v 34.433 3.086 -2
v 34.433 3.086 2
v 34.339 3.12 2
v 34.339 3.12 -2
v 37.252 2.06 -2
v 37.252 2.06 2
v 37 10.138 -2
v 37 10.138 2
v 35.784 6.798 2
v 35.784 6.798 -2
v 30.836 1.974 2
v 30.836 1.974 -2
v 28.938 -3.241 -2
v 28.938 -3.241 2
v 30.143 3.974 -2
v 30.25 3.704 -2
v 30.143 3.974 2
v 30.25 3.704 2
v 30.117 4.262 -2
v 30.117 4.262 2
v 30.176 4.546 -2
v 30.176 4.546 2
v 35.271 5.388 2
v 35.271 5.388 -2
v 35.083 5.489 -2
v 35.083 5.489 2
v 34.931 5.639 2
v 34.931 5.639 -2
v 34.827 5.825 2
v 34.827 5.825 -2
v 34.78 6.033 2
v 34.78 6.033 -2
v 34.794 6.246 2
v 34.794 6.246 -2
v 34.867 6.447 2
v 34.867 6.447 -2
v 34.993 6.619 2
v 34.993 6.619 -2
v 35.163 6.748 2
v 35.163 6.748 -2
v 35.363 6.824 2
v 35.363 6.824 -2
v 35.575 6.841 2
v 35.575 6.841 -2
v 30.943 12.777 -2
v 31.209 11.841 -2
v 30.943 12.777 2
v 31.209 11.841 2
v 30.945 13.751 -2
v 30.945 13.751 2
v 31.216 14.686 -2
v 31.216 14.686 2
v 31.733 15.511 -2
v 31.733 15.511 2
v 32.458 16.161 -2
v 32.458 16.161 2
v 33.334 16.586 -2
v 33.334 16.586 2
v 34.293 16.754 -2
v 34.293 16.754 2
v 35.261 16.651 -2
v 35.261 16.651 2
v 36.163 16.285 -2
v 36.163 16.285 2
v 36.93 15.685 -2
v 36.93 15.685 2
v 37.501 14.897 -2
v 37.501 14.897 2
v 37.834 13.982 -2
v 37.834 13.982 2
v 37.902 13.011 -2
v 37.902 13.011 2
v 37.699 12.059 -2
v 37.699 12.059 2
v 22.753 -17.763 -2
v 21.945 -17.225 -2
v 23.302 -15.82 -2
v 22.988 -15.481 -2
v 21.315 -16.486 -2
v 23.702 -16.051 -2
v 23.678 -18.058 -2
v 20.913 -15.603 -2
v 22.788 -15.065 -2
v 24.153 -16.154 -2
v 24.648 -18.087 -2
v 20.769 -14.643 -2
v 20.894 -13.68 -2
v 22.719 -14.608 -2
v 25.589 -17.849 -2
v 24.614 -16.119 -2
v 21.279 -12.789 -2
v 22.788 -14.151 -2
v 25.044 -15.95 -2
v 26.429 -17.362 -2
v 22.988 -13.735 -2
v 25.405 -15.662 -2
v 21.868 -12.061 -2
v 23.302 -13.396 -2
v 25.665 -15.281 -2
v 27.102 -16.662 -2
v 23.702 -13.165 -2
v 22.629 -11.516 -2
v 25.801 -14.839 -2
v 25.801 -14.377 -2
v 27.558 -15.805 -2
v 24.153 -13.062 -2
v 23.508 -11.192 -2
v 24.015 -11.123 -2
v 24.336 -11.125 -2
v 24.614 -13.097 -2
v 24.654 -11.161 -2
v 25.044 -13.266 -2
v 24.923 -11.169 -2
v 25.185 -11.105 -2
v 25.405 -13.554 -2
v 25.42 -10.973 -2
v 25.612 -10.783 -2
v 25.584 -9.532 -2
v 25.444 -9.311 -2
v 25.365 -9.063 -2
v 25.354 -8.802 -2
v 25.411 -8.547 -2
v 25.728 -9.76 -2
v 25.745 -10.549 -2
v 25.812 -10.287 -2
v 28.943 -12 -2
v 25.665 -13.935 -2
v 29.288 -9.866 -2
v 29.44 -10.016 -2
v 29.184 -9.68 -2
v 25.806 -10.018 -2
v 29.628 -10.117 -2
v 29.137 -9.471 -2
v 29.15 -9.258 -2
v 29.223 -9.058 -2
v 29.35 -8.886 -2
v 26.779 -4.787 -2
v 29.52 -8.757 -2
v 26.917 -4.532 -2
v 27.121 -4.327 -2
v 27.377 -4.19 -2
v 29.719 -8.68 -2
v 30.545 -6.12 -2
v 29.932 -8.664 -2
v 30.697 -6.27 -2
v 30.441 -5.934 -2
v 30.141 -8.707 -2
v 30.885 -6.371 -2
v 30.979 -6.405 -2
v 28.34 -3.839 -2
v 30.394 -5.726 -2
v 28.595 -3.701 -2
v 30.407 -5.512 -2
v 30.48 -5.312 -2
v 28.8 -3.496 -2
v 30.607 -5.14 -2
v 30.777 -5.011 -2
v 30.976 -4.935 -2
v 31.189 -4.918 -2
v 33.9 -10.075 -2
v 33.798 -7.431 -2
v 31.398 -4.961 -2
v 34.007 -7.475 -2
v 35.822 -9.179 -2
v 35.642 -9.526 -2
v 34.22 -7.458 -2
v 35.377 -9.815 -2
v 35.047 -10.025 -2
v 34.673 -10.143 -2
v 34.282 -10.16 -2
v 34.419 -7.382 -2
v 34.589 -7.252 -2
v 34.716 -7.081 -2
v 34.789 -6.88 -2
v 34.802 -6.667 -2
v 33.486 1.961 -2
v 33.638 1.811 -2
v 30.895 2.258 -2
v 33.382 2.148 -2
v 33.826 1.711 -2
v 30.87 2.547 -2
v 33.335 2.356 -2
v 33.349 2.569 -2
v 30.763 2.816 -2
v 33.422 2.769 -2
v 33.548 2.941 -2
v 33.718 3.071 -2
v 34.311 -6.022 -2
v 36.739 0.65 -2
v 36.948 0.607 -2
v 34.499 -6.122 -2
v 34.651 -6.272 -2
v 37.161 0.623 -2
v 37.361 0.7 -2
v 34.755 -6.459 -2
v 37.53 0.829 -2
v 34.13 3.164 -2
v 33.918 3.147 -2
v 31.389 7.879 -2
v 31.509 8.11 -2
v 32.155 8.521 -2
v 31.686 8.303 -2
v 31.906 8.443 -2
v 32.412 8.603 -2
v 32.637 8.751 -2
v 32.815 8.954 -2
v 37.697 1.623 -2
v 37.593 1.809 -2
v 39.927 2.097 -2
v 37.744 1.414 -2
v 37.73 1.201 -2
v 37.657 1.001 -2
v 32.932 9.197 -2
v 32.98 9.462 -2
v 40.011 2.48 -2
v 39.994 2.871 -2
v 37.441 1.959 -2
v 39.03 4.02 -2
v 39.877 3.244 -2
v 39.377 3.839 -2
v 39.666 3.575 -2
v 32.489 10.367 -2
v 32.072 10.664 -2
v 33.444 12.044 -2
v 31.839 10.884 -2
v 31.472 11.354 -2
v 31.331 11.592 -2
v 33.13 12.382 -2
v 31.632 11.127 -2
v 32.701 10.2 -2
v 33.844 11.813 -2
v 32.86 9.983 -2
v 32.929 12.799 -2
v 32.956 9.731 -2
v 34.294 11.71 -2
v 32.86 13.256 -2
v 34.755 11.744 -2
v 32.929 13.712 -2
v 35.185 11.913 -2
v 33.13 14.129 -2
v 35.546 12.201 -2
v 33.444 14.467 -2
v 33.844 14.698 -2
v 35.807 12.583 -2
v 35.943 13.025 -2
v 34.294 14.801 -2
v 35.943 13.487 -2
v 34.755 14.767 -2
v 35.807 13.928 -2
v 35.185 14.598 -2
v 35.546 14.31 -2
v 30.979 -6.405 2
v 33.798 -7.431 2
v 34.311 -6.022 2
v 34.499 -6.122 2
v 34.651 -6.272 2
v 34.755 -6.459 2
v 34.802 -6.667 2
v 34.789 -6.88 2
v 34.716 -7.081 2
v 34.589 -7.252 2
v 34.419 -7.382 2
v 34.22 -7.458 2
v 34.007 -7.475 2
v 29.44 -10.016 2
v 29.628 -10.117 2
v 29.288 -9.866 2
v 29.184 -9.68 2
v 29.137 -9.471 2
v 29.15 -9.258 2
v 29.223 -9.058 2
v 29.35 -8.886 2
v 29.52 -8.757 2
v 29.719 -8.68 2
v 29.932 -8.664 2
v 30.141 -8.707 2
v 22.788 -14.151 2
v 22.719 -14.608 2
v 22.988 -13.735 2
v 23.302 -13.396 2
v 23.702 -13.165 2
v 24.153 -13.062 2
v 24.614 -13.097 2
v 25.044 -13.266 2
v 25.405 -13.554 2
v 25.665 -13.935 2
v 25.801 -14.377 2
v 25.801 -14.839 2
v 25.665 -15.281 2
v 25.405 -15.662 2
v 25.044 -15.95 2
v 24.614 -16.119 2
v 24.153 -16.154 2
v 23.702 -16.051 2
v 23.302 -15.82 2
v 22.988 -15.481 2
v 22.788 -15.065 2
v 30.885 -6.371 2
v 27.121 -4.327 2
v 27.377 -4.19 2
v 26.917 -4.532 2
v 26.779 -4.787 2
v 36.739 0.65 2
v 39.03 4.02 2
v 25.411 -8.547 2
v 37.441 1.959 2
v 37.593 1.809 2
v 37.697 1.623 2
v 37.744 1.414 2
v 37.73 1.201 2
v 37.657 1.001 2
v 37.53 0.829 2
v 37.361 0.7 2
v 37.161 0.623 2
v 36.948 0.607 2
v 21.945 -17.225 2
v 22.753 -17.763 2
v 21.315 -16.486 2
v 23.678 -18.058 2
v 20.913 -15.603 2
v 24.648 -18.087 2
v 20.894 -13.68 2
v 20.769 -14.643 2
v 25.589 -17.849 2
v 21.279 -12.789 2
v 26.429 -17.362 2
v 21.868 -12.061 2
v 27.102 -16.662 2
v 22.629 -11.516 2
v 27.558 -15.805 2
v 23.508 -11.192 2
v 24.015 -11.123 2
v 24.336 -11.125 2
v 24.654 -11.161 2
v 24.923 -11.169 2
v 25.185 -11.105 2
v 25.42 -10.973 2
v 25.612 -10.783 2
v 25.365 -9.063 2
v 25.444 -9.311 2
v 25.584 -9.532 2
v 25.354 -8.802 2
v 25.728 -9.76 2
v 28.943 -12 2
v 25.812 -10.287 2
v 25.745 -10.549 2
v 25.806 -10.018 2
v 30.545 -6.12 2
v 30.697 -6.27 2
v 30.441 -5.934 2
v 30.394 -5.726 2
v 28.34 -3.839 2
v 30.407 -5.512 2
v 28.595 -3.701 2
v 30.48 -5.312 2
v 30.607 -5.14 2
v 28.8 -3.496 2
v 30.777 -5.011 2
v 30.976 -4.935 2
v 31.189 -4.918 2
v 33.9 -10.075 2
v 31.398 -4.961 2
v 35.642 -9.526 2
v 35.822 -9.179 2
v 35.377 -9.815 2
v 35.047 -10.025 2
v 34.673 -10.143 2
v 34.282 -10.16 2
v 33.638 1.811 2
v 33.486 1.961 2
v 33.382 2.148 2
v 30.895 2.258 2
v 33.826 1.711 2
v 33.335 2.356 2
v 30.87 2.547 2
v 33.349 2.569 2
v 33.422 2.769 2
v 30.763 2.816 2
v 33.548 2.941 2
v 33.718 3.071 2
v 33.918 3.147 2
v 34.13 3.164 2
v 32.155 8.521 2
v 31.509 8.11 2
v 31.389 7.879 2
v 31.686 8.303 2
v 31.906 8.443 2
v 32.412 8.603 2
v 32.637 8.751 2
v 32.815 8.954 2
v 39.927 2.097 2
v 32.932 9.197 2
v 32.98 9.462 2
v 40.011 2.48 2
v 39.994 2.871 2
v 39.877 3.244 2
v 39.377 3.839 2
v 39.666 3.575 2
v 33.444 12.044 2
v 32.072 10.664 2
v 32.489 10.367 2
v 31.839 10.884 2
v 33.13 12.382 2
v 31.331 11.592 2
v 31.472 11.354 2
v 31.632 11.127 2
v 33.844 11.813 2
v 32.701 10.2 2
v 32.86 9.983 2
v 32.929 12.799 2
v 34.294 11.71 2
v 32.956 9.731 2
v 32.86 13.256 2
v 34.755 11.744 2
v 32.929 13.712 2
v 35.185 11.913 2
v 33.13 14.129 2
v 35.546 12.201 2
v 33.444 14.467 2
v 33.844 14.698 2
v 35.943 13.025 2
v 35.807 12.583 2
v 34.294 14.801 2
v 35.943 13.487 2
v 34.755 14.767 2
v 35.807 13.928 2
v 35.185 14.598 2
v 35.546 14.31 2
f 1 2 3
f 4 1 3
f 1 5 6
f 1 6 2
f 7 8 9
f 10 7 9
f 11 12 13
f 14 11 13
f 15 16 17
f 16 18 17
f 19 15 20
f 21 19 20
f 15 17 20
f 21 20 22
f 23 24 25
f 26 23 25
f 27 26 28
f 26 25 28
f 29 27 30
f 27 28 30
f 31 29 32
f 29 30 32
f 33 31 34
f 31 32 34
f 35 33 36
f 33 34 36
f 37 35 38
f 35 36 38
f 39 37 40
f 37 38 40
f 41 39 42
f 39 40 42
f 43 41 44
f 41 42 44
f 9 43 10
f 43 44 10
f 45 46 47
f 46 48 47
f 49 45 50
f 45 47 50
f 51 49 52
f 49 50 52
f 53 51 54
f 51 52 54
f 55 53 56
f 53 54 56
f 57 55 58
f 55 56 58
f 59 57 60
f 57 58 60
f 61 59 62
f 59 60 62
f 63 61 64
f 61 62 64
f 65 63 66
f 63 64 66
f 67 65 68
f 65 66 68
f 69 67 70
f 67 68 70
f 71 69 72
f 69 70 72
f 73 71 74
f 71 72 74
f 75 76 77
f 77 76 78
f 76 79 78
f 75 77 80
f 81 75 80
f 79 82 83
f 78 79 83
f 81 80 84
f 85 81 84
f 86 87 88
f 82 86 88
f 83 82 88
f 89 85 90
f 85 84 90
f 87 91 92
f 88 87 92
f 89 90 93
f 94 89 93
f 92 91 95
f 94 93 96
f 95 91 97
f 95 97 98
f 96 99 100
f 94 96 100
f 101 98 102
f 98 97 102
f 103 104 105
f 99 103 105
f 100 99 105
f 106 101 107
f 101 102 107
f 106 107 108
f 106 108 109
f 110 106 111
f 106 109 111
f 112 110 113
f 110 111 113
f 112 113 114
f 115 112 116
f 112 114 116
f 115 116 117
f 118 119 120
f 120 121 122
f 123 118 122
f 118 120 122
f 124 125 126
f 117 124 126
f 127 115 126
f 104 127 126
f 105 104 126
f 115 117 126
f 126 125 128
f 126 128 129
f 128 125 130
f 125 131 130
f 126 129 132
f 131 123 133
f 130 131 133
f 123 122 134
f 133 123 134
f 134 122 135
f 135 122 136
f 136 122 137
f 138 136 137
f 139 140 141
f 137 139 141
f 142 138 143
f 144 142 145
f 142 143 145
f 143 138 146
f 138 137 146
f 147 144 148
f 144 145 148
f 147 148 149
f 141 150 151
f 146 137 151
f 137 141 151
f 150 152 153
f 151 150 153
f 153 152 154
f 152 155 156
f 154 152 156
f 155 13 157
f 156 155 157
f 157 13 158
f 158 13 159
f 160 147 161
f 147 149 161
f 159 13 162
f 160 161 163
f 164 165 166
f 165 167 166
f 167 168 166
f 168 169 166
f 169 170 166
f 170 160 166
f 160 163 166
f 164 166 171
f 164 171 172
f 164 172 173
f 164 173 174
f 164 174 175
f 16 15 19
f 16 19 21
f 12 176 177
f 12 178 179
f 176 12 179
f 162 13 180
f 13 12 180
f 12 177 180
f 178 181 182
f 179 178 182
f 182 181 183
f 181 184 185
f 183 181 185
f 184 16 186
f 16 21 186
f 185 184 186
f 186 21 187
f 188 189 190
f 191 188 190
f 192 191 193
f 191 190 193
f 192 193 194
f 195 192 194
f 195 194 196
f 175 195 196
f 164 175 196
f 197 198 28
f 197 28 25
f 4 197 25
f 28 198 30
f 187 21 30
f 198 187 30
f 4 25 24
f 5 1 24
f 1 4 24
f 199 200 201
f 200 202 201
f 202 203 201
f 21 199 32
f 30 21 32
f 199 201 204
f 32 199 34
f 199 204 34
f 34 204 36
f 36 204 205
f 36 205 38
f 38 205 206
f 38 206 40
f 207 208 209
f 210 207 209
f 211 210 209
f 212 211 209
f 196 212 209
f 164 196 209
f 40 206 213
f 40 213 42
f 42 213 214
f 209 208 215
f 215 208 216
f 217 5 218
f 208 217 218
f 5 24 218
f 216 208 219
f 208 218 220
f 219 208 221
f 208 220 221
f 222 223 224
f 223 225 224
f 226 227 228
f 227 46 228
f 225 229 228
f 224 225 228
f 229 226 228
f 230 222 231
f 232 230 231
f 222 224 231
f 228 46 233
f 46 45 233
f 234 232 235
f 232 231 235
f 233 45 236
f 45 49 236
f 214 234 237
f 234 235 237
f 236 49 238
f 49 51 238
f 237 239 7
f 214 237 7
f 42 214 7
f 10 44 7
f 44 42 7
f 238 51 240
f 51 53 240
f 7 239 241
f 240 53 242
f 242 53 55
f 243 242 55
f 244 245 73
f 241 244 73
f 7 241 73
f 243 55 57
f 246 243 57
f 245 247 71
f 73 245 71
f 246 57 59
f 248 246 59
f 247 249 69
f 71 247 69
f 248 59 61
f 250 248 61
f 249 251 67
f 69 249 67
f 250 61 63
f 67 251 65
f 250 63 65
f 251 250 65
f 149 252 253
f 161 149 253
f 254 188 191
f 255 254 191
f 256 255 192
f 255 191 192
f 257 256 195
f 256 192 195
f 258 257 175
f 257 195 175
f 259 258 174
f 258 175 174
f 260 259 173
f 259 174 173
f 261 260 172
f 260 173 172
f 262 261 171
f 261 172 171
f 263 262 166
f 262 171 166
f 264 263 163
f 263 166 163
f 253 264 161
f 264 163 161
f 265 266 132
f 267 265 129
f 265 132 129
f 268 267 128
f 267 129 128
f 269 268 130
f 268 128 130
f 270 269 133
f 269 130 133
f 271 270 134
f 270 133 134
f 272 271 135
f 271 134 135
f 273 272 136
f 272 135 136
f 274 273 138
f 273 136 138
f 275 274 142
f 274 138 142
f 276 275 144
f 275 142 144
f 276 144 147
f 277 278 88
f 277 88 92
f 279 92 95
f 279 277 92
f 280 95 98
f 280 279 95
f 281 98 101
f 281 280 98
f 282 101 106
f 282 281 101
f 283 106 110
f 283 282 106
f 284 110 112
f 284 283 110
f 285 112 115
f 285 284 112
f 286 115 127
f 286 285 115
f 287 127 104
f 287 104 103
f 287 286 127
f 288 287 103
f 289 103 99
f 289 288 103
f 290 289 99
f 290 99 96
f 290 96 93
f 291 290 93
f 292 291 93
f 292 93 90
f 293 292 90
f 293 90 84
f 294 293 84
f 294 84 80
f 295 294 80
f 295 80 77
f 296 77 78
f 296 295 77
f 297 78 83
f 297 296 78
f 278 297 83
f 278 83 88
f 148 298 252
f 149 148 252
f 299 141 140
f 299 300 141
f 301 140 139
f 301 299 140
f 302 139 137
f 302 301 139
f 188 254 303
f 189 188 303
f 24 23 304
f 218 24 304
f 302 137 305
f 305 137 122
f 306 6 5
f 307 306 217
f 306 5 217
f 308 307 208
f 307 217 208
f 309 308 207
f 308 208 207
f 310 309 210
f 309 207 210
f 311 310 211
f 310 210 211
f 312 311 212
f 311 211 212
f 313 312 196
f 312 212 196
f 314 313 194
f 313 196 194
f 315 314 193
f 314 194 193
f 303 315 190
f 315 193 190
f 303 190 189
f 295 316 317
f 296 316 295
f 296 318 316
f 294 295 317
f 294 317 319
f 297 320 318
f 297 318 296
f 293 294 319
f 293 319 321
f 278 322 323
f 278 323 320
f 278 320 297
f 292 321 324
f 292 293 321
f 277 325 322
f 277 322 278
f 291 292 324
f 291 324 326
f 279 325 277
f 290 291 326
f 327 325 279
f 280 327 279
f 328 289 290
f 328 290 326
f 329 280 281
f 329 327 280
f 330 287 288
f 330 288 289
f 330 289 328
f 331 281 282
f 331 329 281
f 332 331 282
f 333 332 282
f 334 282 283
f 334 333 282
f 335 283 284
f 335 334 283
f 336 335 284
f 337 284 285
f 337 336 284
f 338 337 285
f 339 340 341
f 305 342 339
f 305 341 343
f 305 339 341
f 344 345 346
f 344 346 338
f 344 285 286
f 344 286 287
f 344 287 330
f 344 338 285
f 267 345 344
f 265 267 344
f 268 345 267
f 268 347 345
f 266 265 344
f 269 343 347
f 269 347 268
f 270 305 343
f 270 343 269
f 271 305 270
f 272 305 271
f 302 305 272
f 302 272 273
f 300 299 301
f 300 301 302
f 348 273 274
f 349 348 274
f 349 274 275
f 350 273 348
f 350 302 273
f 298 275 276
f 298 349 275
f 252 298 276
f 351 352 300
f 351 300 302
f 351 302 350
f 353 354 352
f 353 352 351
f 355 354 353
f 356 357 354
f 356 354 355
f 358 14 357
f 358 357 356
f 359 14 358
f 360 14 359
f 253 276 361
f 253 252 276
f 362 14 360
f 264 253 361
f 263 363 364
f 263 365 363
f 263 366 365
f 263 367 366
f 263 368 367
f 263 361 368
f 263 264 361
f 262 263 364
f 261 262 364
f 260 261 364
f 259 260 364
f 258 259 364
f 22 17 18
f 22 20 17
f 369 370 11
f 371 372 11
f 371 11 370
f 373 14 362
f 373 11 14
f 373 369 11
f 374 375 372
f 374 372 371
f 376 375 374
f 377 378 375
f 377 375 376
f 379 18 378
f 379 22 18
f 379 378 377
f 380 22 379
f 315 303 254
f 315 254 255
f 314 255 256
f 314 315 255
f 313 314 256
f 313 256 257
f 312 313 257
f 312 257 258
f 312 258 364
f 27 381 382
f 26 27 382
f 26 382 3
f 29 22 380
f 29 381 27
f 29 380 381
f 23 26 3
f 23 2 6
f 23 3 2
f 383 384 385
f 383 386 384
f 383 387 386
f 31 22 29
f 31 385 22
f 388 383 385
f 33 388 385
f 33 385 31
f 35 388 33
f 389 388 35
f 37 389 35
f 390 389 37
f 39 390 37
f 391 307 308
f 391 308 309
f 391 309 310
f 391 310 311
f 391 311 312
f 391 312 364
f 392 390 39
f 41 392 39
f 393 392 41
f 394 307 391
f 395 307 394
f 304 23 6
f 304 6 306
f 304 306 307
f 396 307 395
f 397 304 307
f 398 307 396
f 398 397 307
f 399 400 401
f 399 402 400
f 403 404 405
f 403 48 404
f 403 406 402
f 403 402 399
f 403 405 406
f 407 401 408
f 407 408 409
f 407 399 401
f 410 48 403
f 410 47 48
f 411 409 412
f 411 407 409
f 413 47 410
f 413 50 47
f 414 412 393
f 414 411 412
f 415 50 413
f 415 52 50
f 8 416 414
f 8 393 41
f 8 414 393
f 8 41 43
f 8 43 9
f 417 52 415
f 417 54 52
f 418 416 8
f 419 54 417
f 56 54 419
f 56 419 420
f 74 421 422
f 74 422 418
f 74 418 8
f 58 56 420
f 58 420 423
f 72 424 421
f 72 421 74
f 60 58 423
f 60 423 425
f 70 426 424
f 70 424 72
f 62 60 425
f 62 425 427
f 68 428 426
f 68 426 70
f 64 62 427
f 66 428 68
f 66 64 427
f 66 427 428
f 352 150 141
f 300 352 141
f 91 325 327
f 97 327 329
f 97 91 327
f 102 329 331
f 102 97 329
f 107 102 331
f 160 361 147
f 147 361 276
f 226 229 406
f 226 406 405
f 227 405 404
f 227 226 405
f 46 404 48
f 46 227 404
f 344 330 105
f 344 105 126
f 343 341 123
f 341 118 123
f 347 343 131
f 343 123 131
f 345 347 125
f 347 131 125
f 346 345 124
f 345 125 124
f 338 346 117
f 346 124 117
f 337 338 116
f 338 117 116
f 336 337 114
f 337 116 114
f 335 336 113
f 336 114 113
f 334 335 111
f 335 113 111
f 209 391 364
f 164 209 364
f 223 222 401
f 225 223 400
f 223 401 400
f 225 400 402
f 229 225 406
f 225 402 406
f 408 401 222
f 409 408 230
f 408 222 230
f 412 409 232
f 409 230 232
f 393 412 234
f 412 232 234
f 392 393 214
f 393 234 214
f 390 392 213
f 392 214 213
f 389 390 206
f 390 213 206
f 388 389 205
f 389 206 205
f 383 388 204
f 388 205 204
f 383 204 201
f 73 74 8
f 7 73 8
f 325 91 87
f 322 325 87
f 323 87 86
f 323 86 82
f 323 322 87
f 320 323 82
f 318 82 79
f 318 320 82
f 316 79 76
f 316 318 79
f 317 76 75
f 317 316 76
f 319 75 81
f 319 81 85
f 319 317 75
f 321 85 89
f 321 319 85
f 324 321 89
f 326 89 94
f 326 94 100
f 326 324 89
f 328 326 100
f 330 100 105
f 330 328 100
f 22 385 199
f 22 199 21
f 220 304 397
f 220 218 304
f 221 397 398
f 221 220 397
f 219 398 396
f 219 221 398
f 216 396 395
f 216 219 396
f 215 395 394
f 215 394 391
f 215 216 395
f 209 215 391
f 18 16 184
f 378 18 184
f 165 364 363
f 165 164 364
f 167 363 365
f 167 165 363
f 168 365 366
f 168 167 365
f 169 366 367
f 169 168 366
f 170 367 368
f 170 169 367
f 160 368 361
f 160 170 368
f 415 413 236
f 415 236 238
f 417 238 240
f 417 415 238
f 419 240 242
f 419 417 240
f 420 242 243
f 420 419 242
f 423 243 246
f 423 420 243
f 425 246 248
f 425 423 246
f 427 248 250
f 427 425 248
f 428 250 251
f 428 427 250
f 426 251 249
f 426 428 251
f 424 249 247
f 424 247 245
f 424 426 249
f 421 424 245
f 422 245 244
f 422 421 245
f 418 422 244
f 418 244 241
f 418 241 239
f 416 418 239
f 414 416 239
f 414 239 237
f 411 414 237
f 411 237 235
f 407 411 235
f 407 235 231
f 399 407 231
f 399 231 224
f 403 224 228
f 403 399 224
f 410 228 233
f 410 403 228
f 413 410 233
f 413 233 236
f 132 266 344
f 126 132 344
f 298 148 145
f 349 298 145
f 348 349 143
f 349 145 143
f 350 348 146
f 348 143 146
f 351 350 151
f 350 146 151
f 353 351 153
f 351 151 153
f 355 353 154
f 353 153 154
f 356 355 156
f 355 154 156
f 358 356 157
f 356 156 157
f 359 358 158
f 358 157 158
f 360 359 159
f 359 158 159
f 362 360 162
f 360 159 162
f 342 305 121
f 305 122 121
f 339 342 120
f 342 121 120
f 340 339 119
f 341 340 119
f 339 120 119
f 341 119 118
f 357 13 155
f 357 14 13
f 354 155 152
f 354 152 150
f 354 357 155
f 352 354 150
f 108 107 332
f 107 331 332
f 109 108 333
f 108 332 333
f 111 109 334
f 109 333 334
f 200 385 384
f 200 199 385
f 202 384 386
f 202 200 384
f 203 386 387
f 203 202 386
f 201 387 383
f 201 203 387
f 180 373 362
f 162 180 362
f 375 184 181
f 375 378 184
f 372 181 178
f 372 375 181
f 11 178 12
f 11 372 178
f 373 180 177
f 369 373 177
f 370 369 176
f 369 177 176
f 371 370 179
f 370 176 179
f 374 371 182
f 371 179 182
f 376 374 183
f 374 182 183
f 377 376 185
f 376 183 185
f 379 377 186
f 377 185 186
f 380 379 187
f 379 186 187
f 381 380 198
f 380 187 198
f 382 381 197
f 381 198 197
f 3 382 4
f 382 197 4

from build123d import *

# Parameters (mm, degrees)
SKETCH_1_R             = 7
SKETCH_1_R_2           = 1.55
EXTRUDE_1_DEPTH        = 2
FILLET_1_R             = 1
CUT_EXTRUDE_START      = -5
CUT_EXTRUDE_1_DEPTH    = 6
FILLET_2_R             = 1
FILLET_2_OF_MIRROR_1_R = 1
SKETCH_3_R             = 1.55
EXTRUDE_2_DEPTH        = 4
FILLET_3_R             = 1
CUT_EXTRUDE_2_DEPTH    = 5
FILLET_4_R             = 1
CUT_EXTRUDE_3_DEPTH    = 5
EXTRUDE_3_DEPTH        = 4
SKETCH_8_R             = 0.75
CUT_EXTRUDE_4_DEPTH    = 5
FILLET_5_R             = 1.5
CUT_EXTRUDE_5_DEPTH    = 5
EXTRUDE_4_DEPTH        = 4
CUT_EXTRUDE_6_DEPTH    = 5
SKETCH_12_R            = 1
CUT_EXTRUDE_7_DEPTH    = 5
FILLET_6_R             = 3
FILLET_7_R             = 1
FILLET_8_R             = 1


with BuildPart() as part:
    # 草图1 → 凸台-拉伸1 (new body, symmetric)
    with BuildSketch(Plane.XY):
        with BuildLine():
            Line((-17.5, 11), (-10, 11))
            Line((-10, 11), (-8.321800738, 9))
            Line((-8.321800738, 9), (8.321800738, 9))
            Line((8.321800738, 9), (10, 11))
            Line((10, 11), (17.5, 11))
            ThreePointArc((17.5, 11), (17.577641076, 10.999138732), (17.655243941, 10.99655535))
            Line((17.655243941, 10.99655535), (37, 10.137665421))
            Line((37, 10.137665421), (28.942548731, -12))
            Line((28.942548731, -12), (17.199216279, -10.987051642))
            ThreePointArc((17.199216279, -10.987051642), (15.184578245, -10.124656567), (14.077678472, -8.233290774))
            Line((14.077678472, -8.233290774), (2.304628146, -10.75586766))
            ThreePointArc((2.304628146, -10.75586766), (0, -11), (-2.304628146, -10.75586766))
            Line((-2.304628146, -10.75586766), (-14.077678472, -8.233290774))
            ThreePointArc((-14.077678472, -8.233290774), (-15.184578245, -10.124656567), (-17.199216279, -10.987051642))
            Line((-17.199216279, -10.987051642), (-28.942548731, -12))
            Line((-28.942548731, -12), (-37, 10.137665421))
            Line((-37, 10.137665421), (-17.655243941, 10.99655535))
            ThreePointArc((-17.655243941, 10.99655535), (-17.577641076, 10.999138732), (-17.5, 11))
        make_face()
        Circle(SKETCH_1_R, mode=Mode.SUBTRACT)
        with Locations((17.5, 7.5)):
            Circle(SKETCH_1_R_2, mode=Mode.SUBTRACT)
        with Locations((17.5, -7.5)):
            Circle(SKETCH_1_R_2, mode=Mode.SUBTRACT)
        with Locations((-17.5, -7.5)):
            Circle(SKETCH_1_R_2, mode=Mode.SUBTRACT)
        with Locations((-17.5, 7.5)):
            Circle(SKETCH_1_R_2, mode=Mode.SUBTRACT)
    extrude(amount=EXTRUDE_1_DEPTH, both=True)

    # 圆角1
    fillet_1_edges = [part.edges().sort_by_distance(p)[0] for p in [
        (14.077678472, -8.233290774, 0),
        (-14.077678472, -8.233290774, 0),
    ]]
    fillet(fillet_1_edges, radius=FILLET_1_R)

    # 草图2 → 切除-拉伸1 (cut)
    with BuildSketch(Plane.XY.offset(2).offset(CUT_EXTRUDE_START)):
        Polygon((-20.5, 7.867295251), (-32.782632739, 7.321957304), (-27.222903771, -7.953272497), align=None)
        with BuildLine():
            Line((-19.251811465, 4.412338006), (-24.573190843, -8.11011447))
            Line((-24.573190843, -8.11011447), (-21.036866665, -7.805080632))
            ThreePointArc((-21.036866665, -7.805080632), (-20.623106229, -5.812188553), (-19.182687898, -4.374130291))
            Line((-19.182687898, -4.374130291), (-15.331076504, 4.689613751))
            ThreePointArc((-15.331076504, 4.689613751), (-17.24956823, 3.958844267), (-19.251811465, 4.412338006))
        make_face()
    cut_extrude_1 = extrude(amount=CUT_EXTRUDE_1_DEPTH, mode=Mode.SUBTRACT)

    # 圆角2
    fillet_2_edges = [part.edges().sort_by_distance(p)[0] for p in [
        (-20.5, 7.867295251, 0),
        (-27.222903771, -7.953272497, 0),
        (-32.782632739, 7.321957304, 0),
        (-19.251811465, 4.412338006, 0),
        (-15.331076504, 4.689613751, 0),
        (-19.182687898, -4.374130291, 0),
        (-21.036866665, -7.805080632, 0),
        (-24.573190843, -8.11011447, 0),
    ]]
    fillet(fillet_2_edges, radius=FILLET_2_R)

    # 镜向1: 切除-拉伸1 across plane
    add(cut_extrude_1.mirror(Plane(origin=(0, 0, 0), x_dir=(0, 0, 1), z_dir=(1, 0, 0))), mode=Mode.SUBTRACT)

    # 圆角2 of 镜向1
    fillet_2_of_mirror_1_edges = [part.edges().sort_by_distance(p)[0] for p in [
        (20.5, 7.867295251, 0),
        (27.222903771, -7.953272497, 0),
        (32.782632739, 7.321957304, 0),
        (19.251811465, 4.412338006, 0),
        (15.331076504, 4.689613751, 0),
        (19.182687898, -4.374130291, 0),
        (21.036866665, -7.805080632, 0),
        (24.573190843, -8.11011447, 0),
    ]]
    fillet(fillet_2_of_mirror_1_edges, radius=FILLET_2_OF_MIRROR_1_R)

    # 草图3 → 凸台-拉伸2 (add)
    with BuildSketch(Plane.XY.offset(2)):
        with BuildLine():
            Line((-37.69913918, 12.058534531), (-37, 10.137665421))
            Line((-37, 10.137665421), (-32.4761474, 10.338520445))
            ThreePointArc((-32.4761474, 10.338520445), (-33.315445081, 16.579981486), (-37.69913918, 12.058534531))
        make_face()
        with Locations((-34.410215007, 13.255605032)):
            Circle(SKETCH_3_R, mode=Mode.SUBTRACT)
        with BuildLine():
            Line((-27.557621455, -15.805056417), (-28.942548731, -12))
            Line((-28.942548731, -12), (-22.730405687, -11.464157204))
            ThreePointArc((-22.730405687, -11.464157204), (-21.928391725, -17.210478932), (-27.557621455, -15.805056417))
        make_face()
        with Locations((-24.268697282, -14.607985915)):
            Circle(SKETCH_3_R, mode=Mode.SUBTRACT)
    extrude_2 = extrude(amount=-EXTRUDE_2_DEPTH)

    # 镜向2: 凸台-拉伸2 across plane
    add(extrude_2.mirror(Plane(origin=(0, 0, 0), x_dir=(0, 0, 1), z_dir=(1, 0, 0))))

    # 圆角3
    fillet_3_edges = [part.edges().sort_by_distance(p)[0] for p in [
        (-22.730405687, -11.464157204, 0),
        (-32.4761474, 10.338520445, 0),
        (22.730405687, -11.464157204, 0),
        (32.4761474, 10.338520445, 0),
    ]]
    fillet(fillet_3_edges, radius=FILLET_3_R)

    # 草图4 → 切除-拉伸2 (cut, through all)
    with BuildSketch(Plane.XY.offset(2)):
        with BuildLine():
            Line((-16.384851826, -4.1824038), (-12.057869255, 6))
            Line((-12.057869255, 6), (-8, 6))
            ThreePointArc((-8, 6), (-9.993390733, -0.363512948), (-7.542930102, -6.565379309))
            Line((-7.542930102, -6.565379309), (-15.108699944, -4.944284045))
            ThreePointArc((-15.108699944, -4.944284045), (-15.705867849, -4.49482283), (-16.384851826, -4.1824038))
        make_face()
    cut_extrude_2 = extrude(amount=-CUT_EXTRUDE_2_DEPTH, mode=Mode.SUBTRACT)

    # 镜向3: 切除-拉伸2 across plane
    add(cut_extrude_2.mirror(Plane(origin=(0, 0, 0), x_dir=(0, 0, 1), z_dir=(1, 0, 0))), mode=Mode.SUBTRACT)

    # 圆角4
    fillet_4_edges = [part.edges().sort_by_distance(p)[0] for p in [
        (-12.057869255, 6, 0),
        (-8, 6, 0),
        (-7.542930102, -6.565379309, 0),
        (-15.108699944, -4.944284045, 0),
        (-16.384851826, -4.1824038, 0),
        (8, 6, 0),
        (12.057869255, 6, 0),
        (16.384851826, -4.1824038, 0),
        (15.108699944, -4.944284045, 0),
        (7.542930102, -6.565379309, 0),
    ]]
    fillet(fillet_4_edges, radius=FILLET_4_R)

    # 草图5 → 切除-拉伸3 (cut, through all)
    with BuildSketch(Plane.XY.offset(2)):
        Polygon((30.884976598, -6.370842854), (33.798023723, -7.431105298), (37.25242717, 2.059790172), (34.339380046, 3.120052616), align=None)
    cut_extrude_3 = extrude(amount=-CUT_EXTRUDE_3_DEPTH, mode=Mode.SUBTRACT)

    # 草图7 → 凸台-拉伸3 (add)
    with BuildSketch(Plane.XY.offset(2)):
        Polygon((35.271298659, 5.388097522), (40.439608074, 3.506986734), (35.309305924, -10.588402578), (30.140996509, -8.707291789), (30.97894586, -6.405044868), (33.798023723, -7.431105298), (37.25242717, 2.059790172), (34.433349308, 3.085850601), align=None)
    extrude_3 = extrude(amount=-EXTRUDE_3_DEPTH)

    # 镜向4: 切除-拉伸3, 凸台-拉伸3 across plane
    add(cut_extrude_3.mirror(Plane(origin=(0, 0, 0), x_dir=(0, 0, 1), z_dir=(1, 0, 0))), mode=Mode.SUBTRACT)
    add(extrude_3.mirror(Plane(origin=(0, 0, 0), x_dir=(0, 0, 1), z_dir=(1, 0, 0))))

    # 草图8 → 切除-拉伸4 (cut, through all)
    with BuildSketch(Plane(origin=(0, 0, -2), x_dir=(-1, 0, 0), z_dir=(0, 0, -1))):
        with Locations((-36.995912063, 1.355020706)):
            Circle(SKETCH_8_R)
        with Locations((-34.082864939, 2.41528315)):
            Circle(SKETCH_8_R)
        with Locations((-34.05453883, -6.726335833)):
            Circle(SKETCH_8_R)
        with Locations((-31.141491706, -5.666073389)):
            Circle(SKETCH_8_R)
        with Locations((-35.527813767, 6.092866988)):
            Circle(SKETCH_8_R)
        with Locations((-29.884481402, -9.412061255)):
            Circle(SKETCH_8_R)
    cut_extrude_4 = extrude(amount=-CUT_EXTRUDE_4_DEPTH, mode=Mode.SUBTRACT)

    # 镜向5: 切除-拉伸4 across plane
    add(cut_extrude_4.mirror(Plane(origin=(0, 0, 0), x_dir=(0, 0, 1), z_dir=(1, 0, 0))), mode=Mode.SUBTRACT)

    # 圆角5
    fillet_5_edges = [part.edges().sort_by_distance(p)[0] for p in [
        (40.439608074, 3.506986734, 0),
        (35.309305924, -10.588402578, 0),
        (-40.439608074, 3.506986734, 0),
        (-35.309305924, -10.588402578, 0),
    ]]
    fillet(fillet_5_edges, radius=FILLET_5_R)

    # 草图9 → 切除-拉伸5 (cut, through all)
    with BuildSketch(Plane(origin=(0, 0, -2), x_dir=(-1, 0, 0), z_dir=(0, 0, -1))):
        with BuildLine():
            Line((-32.316536273, 6.041367788), (-33.695268787, 9.829404235))
            ThreePointArc((-33.695268787, 9.829404235), (-30.928713694, 13.614977548), (-34.410215007, 16.755605032))
            Line((-34.410215007, 16.755605032), (45.589784993, 16.755605032))
            Line((45.589784993, 16.755605032), (45.589784993, -18.107985915))
            Line((45.589784993, -18.107985915), (-24.268697282, -18.107985915))
            ThreePointArc((-24.268697282, -18.107985915), (-20.874243549, -13.754942039), (-25.923336124, -11.523805262))
            Line((-25.923336124, -11.523805262), (-28.090663396, -5.56912252))
            Line((-28.090663396, -5.56912252), (-32.316536273, 6.041367788))
        make_face()
    extrude(amount=-CUT_EXTRUDE_5_DEPTH, mode=Mode.SUBTRACT)

    # 草图10 → 凸台-拉伸4 (add)
    with BuildSketch(Plane(origin=(0, 0, -2), x_dir=(-1, 0, 0), z_dir=(0, 0, -1))):
        with BuildLine():
            Line((-32.323351951, 10.445800309), (-24.476175097, -11.114140905))
            ThreePointArc((-24.476175097, -11.114140905), (-25.222020853, -11.240319933), (-25.923336124, -11.523805262))
            Line((-25.923336124, -11.523805262), (-33.695268787, 9.829404235))
            ThreePointArc((-33.695268787, 9.829404235), (-32.975809264, 10.063038641), (-32.323351951, 10.445800309))
        make_face()
    extrude(amount=-EXTRUDE_4_DEPTH)

    # 草图11 → 切除-拉伸6 (cut, through all)
    with BuildSketch(Plane(origin=(0, 0, -2), x_dir=(-1, 0, 0), z_dir=(0, 0, -1))):
        Polygon((-30.016621436, 4.108110305), (-30.995676903, 2.412336493), (-28.778462541, -3.6794099), (-26.938440146, -4.349123282), align=None)
    extrude(amount=-CUT_EXTRUDE_6_DEPTH, mode=Mode.SUBTRACT)

    # 草图12 → 切除-拉伸7 (cut, through all)
    with BuildSketch(Plane(origin=(0, 0, -2), x_dir=(-1, 0, 0), z_dir=(0, 0, -1))):
        with Locations((-31.981331808, 9.506107688)):
            Circle(SKETCH_12_R)
        with Locations((-24.81819524, -10.174448284)):
            Circle(SKETCH_12_R)
    extrude(amount=-CUT_EXTRUDE_7_DEPTH, mode=Mode.SUBTRACT)

    # 圆角6
    fillet_6_edges = [part.edges().sort_by_distance(p)[0] for p in [
        (24.476175097, -11.114140905, 0),
        (32.323351951, 10.445800309, 0),
    ]]
    fillet(fillet_6_edges, radius=FILLET_6_R)

    # 圆角7
    fillet_7_edges = [part.edges().sort_by_distance(p)[0] for p in [
        (28.778462541, -3.6794099, 0),
        (30.995676903, 2.412336493, 0),
    ]]
    fillet(fillet_7_edges, radius=FILLET_7_R)

    # 圆角8
    fillet_8_edges = [part.edges().sort_by_distance(p)[0] for p in [
        (30.016621436, 4.108110305, 0),
        (26.938440146, -4.349123282, 0),
        (31.639311664, 8.566415067, 0),
        (25.160215383, -9.234755664, 0),
    ]]
    fillet(fillet_8_edges, radius=FILLET_8_R)


solid = part.part
